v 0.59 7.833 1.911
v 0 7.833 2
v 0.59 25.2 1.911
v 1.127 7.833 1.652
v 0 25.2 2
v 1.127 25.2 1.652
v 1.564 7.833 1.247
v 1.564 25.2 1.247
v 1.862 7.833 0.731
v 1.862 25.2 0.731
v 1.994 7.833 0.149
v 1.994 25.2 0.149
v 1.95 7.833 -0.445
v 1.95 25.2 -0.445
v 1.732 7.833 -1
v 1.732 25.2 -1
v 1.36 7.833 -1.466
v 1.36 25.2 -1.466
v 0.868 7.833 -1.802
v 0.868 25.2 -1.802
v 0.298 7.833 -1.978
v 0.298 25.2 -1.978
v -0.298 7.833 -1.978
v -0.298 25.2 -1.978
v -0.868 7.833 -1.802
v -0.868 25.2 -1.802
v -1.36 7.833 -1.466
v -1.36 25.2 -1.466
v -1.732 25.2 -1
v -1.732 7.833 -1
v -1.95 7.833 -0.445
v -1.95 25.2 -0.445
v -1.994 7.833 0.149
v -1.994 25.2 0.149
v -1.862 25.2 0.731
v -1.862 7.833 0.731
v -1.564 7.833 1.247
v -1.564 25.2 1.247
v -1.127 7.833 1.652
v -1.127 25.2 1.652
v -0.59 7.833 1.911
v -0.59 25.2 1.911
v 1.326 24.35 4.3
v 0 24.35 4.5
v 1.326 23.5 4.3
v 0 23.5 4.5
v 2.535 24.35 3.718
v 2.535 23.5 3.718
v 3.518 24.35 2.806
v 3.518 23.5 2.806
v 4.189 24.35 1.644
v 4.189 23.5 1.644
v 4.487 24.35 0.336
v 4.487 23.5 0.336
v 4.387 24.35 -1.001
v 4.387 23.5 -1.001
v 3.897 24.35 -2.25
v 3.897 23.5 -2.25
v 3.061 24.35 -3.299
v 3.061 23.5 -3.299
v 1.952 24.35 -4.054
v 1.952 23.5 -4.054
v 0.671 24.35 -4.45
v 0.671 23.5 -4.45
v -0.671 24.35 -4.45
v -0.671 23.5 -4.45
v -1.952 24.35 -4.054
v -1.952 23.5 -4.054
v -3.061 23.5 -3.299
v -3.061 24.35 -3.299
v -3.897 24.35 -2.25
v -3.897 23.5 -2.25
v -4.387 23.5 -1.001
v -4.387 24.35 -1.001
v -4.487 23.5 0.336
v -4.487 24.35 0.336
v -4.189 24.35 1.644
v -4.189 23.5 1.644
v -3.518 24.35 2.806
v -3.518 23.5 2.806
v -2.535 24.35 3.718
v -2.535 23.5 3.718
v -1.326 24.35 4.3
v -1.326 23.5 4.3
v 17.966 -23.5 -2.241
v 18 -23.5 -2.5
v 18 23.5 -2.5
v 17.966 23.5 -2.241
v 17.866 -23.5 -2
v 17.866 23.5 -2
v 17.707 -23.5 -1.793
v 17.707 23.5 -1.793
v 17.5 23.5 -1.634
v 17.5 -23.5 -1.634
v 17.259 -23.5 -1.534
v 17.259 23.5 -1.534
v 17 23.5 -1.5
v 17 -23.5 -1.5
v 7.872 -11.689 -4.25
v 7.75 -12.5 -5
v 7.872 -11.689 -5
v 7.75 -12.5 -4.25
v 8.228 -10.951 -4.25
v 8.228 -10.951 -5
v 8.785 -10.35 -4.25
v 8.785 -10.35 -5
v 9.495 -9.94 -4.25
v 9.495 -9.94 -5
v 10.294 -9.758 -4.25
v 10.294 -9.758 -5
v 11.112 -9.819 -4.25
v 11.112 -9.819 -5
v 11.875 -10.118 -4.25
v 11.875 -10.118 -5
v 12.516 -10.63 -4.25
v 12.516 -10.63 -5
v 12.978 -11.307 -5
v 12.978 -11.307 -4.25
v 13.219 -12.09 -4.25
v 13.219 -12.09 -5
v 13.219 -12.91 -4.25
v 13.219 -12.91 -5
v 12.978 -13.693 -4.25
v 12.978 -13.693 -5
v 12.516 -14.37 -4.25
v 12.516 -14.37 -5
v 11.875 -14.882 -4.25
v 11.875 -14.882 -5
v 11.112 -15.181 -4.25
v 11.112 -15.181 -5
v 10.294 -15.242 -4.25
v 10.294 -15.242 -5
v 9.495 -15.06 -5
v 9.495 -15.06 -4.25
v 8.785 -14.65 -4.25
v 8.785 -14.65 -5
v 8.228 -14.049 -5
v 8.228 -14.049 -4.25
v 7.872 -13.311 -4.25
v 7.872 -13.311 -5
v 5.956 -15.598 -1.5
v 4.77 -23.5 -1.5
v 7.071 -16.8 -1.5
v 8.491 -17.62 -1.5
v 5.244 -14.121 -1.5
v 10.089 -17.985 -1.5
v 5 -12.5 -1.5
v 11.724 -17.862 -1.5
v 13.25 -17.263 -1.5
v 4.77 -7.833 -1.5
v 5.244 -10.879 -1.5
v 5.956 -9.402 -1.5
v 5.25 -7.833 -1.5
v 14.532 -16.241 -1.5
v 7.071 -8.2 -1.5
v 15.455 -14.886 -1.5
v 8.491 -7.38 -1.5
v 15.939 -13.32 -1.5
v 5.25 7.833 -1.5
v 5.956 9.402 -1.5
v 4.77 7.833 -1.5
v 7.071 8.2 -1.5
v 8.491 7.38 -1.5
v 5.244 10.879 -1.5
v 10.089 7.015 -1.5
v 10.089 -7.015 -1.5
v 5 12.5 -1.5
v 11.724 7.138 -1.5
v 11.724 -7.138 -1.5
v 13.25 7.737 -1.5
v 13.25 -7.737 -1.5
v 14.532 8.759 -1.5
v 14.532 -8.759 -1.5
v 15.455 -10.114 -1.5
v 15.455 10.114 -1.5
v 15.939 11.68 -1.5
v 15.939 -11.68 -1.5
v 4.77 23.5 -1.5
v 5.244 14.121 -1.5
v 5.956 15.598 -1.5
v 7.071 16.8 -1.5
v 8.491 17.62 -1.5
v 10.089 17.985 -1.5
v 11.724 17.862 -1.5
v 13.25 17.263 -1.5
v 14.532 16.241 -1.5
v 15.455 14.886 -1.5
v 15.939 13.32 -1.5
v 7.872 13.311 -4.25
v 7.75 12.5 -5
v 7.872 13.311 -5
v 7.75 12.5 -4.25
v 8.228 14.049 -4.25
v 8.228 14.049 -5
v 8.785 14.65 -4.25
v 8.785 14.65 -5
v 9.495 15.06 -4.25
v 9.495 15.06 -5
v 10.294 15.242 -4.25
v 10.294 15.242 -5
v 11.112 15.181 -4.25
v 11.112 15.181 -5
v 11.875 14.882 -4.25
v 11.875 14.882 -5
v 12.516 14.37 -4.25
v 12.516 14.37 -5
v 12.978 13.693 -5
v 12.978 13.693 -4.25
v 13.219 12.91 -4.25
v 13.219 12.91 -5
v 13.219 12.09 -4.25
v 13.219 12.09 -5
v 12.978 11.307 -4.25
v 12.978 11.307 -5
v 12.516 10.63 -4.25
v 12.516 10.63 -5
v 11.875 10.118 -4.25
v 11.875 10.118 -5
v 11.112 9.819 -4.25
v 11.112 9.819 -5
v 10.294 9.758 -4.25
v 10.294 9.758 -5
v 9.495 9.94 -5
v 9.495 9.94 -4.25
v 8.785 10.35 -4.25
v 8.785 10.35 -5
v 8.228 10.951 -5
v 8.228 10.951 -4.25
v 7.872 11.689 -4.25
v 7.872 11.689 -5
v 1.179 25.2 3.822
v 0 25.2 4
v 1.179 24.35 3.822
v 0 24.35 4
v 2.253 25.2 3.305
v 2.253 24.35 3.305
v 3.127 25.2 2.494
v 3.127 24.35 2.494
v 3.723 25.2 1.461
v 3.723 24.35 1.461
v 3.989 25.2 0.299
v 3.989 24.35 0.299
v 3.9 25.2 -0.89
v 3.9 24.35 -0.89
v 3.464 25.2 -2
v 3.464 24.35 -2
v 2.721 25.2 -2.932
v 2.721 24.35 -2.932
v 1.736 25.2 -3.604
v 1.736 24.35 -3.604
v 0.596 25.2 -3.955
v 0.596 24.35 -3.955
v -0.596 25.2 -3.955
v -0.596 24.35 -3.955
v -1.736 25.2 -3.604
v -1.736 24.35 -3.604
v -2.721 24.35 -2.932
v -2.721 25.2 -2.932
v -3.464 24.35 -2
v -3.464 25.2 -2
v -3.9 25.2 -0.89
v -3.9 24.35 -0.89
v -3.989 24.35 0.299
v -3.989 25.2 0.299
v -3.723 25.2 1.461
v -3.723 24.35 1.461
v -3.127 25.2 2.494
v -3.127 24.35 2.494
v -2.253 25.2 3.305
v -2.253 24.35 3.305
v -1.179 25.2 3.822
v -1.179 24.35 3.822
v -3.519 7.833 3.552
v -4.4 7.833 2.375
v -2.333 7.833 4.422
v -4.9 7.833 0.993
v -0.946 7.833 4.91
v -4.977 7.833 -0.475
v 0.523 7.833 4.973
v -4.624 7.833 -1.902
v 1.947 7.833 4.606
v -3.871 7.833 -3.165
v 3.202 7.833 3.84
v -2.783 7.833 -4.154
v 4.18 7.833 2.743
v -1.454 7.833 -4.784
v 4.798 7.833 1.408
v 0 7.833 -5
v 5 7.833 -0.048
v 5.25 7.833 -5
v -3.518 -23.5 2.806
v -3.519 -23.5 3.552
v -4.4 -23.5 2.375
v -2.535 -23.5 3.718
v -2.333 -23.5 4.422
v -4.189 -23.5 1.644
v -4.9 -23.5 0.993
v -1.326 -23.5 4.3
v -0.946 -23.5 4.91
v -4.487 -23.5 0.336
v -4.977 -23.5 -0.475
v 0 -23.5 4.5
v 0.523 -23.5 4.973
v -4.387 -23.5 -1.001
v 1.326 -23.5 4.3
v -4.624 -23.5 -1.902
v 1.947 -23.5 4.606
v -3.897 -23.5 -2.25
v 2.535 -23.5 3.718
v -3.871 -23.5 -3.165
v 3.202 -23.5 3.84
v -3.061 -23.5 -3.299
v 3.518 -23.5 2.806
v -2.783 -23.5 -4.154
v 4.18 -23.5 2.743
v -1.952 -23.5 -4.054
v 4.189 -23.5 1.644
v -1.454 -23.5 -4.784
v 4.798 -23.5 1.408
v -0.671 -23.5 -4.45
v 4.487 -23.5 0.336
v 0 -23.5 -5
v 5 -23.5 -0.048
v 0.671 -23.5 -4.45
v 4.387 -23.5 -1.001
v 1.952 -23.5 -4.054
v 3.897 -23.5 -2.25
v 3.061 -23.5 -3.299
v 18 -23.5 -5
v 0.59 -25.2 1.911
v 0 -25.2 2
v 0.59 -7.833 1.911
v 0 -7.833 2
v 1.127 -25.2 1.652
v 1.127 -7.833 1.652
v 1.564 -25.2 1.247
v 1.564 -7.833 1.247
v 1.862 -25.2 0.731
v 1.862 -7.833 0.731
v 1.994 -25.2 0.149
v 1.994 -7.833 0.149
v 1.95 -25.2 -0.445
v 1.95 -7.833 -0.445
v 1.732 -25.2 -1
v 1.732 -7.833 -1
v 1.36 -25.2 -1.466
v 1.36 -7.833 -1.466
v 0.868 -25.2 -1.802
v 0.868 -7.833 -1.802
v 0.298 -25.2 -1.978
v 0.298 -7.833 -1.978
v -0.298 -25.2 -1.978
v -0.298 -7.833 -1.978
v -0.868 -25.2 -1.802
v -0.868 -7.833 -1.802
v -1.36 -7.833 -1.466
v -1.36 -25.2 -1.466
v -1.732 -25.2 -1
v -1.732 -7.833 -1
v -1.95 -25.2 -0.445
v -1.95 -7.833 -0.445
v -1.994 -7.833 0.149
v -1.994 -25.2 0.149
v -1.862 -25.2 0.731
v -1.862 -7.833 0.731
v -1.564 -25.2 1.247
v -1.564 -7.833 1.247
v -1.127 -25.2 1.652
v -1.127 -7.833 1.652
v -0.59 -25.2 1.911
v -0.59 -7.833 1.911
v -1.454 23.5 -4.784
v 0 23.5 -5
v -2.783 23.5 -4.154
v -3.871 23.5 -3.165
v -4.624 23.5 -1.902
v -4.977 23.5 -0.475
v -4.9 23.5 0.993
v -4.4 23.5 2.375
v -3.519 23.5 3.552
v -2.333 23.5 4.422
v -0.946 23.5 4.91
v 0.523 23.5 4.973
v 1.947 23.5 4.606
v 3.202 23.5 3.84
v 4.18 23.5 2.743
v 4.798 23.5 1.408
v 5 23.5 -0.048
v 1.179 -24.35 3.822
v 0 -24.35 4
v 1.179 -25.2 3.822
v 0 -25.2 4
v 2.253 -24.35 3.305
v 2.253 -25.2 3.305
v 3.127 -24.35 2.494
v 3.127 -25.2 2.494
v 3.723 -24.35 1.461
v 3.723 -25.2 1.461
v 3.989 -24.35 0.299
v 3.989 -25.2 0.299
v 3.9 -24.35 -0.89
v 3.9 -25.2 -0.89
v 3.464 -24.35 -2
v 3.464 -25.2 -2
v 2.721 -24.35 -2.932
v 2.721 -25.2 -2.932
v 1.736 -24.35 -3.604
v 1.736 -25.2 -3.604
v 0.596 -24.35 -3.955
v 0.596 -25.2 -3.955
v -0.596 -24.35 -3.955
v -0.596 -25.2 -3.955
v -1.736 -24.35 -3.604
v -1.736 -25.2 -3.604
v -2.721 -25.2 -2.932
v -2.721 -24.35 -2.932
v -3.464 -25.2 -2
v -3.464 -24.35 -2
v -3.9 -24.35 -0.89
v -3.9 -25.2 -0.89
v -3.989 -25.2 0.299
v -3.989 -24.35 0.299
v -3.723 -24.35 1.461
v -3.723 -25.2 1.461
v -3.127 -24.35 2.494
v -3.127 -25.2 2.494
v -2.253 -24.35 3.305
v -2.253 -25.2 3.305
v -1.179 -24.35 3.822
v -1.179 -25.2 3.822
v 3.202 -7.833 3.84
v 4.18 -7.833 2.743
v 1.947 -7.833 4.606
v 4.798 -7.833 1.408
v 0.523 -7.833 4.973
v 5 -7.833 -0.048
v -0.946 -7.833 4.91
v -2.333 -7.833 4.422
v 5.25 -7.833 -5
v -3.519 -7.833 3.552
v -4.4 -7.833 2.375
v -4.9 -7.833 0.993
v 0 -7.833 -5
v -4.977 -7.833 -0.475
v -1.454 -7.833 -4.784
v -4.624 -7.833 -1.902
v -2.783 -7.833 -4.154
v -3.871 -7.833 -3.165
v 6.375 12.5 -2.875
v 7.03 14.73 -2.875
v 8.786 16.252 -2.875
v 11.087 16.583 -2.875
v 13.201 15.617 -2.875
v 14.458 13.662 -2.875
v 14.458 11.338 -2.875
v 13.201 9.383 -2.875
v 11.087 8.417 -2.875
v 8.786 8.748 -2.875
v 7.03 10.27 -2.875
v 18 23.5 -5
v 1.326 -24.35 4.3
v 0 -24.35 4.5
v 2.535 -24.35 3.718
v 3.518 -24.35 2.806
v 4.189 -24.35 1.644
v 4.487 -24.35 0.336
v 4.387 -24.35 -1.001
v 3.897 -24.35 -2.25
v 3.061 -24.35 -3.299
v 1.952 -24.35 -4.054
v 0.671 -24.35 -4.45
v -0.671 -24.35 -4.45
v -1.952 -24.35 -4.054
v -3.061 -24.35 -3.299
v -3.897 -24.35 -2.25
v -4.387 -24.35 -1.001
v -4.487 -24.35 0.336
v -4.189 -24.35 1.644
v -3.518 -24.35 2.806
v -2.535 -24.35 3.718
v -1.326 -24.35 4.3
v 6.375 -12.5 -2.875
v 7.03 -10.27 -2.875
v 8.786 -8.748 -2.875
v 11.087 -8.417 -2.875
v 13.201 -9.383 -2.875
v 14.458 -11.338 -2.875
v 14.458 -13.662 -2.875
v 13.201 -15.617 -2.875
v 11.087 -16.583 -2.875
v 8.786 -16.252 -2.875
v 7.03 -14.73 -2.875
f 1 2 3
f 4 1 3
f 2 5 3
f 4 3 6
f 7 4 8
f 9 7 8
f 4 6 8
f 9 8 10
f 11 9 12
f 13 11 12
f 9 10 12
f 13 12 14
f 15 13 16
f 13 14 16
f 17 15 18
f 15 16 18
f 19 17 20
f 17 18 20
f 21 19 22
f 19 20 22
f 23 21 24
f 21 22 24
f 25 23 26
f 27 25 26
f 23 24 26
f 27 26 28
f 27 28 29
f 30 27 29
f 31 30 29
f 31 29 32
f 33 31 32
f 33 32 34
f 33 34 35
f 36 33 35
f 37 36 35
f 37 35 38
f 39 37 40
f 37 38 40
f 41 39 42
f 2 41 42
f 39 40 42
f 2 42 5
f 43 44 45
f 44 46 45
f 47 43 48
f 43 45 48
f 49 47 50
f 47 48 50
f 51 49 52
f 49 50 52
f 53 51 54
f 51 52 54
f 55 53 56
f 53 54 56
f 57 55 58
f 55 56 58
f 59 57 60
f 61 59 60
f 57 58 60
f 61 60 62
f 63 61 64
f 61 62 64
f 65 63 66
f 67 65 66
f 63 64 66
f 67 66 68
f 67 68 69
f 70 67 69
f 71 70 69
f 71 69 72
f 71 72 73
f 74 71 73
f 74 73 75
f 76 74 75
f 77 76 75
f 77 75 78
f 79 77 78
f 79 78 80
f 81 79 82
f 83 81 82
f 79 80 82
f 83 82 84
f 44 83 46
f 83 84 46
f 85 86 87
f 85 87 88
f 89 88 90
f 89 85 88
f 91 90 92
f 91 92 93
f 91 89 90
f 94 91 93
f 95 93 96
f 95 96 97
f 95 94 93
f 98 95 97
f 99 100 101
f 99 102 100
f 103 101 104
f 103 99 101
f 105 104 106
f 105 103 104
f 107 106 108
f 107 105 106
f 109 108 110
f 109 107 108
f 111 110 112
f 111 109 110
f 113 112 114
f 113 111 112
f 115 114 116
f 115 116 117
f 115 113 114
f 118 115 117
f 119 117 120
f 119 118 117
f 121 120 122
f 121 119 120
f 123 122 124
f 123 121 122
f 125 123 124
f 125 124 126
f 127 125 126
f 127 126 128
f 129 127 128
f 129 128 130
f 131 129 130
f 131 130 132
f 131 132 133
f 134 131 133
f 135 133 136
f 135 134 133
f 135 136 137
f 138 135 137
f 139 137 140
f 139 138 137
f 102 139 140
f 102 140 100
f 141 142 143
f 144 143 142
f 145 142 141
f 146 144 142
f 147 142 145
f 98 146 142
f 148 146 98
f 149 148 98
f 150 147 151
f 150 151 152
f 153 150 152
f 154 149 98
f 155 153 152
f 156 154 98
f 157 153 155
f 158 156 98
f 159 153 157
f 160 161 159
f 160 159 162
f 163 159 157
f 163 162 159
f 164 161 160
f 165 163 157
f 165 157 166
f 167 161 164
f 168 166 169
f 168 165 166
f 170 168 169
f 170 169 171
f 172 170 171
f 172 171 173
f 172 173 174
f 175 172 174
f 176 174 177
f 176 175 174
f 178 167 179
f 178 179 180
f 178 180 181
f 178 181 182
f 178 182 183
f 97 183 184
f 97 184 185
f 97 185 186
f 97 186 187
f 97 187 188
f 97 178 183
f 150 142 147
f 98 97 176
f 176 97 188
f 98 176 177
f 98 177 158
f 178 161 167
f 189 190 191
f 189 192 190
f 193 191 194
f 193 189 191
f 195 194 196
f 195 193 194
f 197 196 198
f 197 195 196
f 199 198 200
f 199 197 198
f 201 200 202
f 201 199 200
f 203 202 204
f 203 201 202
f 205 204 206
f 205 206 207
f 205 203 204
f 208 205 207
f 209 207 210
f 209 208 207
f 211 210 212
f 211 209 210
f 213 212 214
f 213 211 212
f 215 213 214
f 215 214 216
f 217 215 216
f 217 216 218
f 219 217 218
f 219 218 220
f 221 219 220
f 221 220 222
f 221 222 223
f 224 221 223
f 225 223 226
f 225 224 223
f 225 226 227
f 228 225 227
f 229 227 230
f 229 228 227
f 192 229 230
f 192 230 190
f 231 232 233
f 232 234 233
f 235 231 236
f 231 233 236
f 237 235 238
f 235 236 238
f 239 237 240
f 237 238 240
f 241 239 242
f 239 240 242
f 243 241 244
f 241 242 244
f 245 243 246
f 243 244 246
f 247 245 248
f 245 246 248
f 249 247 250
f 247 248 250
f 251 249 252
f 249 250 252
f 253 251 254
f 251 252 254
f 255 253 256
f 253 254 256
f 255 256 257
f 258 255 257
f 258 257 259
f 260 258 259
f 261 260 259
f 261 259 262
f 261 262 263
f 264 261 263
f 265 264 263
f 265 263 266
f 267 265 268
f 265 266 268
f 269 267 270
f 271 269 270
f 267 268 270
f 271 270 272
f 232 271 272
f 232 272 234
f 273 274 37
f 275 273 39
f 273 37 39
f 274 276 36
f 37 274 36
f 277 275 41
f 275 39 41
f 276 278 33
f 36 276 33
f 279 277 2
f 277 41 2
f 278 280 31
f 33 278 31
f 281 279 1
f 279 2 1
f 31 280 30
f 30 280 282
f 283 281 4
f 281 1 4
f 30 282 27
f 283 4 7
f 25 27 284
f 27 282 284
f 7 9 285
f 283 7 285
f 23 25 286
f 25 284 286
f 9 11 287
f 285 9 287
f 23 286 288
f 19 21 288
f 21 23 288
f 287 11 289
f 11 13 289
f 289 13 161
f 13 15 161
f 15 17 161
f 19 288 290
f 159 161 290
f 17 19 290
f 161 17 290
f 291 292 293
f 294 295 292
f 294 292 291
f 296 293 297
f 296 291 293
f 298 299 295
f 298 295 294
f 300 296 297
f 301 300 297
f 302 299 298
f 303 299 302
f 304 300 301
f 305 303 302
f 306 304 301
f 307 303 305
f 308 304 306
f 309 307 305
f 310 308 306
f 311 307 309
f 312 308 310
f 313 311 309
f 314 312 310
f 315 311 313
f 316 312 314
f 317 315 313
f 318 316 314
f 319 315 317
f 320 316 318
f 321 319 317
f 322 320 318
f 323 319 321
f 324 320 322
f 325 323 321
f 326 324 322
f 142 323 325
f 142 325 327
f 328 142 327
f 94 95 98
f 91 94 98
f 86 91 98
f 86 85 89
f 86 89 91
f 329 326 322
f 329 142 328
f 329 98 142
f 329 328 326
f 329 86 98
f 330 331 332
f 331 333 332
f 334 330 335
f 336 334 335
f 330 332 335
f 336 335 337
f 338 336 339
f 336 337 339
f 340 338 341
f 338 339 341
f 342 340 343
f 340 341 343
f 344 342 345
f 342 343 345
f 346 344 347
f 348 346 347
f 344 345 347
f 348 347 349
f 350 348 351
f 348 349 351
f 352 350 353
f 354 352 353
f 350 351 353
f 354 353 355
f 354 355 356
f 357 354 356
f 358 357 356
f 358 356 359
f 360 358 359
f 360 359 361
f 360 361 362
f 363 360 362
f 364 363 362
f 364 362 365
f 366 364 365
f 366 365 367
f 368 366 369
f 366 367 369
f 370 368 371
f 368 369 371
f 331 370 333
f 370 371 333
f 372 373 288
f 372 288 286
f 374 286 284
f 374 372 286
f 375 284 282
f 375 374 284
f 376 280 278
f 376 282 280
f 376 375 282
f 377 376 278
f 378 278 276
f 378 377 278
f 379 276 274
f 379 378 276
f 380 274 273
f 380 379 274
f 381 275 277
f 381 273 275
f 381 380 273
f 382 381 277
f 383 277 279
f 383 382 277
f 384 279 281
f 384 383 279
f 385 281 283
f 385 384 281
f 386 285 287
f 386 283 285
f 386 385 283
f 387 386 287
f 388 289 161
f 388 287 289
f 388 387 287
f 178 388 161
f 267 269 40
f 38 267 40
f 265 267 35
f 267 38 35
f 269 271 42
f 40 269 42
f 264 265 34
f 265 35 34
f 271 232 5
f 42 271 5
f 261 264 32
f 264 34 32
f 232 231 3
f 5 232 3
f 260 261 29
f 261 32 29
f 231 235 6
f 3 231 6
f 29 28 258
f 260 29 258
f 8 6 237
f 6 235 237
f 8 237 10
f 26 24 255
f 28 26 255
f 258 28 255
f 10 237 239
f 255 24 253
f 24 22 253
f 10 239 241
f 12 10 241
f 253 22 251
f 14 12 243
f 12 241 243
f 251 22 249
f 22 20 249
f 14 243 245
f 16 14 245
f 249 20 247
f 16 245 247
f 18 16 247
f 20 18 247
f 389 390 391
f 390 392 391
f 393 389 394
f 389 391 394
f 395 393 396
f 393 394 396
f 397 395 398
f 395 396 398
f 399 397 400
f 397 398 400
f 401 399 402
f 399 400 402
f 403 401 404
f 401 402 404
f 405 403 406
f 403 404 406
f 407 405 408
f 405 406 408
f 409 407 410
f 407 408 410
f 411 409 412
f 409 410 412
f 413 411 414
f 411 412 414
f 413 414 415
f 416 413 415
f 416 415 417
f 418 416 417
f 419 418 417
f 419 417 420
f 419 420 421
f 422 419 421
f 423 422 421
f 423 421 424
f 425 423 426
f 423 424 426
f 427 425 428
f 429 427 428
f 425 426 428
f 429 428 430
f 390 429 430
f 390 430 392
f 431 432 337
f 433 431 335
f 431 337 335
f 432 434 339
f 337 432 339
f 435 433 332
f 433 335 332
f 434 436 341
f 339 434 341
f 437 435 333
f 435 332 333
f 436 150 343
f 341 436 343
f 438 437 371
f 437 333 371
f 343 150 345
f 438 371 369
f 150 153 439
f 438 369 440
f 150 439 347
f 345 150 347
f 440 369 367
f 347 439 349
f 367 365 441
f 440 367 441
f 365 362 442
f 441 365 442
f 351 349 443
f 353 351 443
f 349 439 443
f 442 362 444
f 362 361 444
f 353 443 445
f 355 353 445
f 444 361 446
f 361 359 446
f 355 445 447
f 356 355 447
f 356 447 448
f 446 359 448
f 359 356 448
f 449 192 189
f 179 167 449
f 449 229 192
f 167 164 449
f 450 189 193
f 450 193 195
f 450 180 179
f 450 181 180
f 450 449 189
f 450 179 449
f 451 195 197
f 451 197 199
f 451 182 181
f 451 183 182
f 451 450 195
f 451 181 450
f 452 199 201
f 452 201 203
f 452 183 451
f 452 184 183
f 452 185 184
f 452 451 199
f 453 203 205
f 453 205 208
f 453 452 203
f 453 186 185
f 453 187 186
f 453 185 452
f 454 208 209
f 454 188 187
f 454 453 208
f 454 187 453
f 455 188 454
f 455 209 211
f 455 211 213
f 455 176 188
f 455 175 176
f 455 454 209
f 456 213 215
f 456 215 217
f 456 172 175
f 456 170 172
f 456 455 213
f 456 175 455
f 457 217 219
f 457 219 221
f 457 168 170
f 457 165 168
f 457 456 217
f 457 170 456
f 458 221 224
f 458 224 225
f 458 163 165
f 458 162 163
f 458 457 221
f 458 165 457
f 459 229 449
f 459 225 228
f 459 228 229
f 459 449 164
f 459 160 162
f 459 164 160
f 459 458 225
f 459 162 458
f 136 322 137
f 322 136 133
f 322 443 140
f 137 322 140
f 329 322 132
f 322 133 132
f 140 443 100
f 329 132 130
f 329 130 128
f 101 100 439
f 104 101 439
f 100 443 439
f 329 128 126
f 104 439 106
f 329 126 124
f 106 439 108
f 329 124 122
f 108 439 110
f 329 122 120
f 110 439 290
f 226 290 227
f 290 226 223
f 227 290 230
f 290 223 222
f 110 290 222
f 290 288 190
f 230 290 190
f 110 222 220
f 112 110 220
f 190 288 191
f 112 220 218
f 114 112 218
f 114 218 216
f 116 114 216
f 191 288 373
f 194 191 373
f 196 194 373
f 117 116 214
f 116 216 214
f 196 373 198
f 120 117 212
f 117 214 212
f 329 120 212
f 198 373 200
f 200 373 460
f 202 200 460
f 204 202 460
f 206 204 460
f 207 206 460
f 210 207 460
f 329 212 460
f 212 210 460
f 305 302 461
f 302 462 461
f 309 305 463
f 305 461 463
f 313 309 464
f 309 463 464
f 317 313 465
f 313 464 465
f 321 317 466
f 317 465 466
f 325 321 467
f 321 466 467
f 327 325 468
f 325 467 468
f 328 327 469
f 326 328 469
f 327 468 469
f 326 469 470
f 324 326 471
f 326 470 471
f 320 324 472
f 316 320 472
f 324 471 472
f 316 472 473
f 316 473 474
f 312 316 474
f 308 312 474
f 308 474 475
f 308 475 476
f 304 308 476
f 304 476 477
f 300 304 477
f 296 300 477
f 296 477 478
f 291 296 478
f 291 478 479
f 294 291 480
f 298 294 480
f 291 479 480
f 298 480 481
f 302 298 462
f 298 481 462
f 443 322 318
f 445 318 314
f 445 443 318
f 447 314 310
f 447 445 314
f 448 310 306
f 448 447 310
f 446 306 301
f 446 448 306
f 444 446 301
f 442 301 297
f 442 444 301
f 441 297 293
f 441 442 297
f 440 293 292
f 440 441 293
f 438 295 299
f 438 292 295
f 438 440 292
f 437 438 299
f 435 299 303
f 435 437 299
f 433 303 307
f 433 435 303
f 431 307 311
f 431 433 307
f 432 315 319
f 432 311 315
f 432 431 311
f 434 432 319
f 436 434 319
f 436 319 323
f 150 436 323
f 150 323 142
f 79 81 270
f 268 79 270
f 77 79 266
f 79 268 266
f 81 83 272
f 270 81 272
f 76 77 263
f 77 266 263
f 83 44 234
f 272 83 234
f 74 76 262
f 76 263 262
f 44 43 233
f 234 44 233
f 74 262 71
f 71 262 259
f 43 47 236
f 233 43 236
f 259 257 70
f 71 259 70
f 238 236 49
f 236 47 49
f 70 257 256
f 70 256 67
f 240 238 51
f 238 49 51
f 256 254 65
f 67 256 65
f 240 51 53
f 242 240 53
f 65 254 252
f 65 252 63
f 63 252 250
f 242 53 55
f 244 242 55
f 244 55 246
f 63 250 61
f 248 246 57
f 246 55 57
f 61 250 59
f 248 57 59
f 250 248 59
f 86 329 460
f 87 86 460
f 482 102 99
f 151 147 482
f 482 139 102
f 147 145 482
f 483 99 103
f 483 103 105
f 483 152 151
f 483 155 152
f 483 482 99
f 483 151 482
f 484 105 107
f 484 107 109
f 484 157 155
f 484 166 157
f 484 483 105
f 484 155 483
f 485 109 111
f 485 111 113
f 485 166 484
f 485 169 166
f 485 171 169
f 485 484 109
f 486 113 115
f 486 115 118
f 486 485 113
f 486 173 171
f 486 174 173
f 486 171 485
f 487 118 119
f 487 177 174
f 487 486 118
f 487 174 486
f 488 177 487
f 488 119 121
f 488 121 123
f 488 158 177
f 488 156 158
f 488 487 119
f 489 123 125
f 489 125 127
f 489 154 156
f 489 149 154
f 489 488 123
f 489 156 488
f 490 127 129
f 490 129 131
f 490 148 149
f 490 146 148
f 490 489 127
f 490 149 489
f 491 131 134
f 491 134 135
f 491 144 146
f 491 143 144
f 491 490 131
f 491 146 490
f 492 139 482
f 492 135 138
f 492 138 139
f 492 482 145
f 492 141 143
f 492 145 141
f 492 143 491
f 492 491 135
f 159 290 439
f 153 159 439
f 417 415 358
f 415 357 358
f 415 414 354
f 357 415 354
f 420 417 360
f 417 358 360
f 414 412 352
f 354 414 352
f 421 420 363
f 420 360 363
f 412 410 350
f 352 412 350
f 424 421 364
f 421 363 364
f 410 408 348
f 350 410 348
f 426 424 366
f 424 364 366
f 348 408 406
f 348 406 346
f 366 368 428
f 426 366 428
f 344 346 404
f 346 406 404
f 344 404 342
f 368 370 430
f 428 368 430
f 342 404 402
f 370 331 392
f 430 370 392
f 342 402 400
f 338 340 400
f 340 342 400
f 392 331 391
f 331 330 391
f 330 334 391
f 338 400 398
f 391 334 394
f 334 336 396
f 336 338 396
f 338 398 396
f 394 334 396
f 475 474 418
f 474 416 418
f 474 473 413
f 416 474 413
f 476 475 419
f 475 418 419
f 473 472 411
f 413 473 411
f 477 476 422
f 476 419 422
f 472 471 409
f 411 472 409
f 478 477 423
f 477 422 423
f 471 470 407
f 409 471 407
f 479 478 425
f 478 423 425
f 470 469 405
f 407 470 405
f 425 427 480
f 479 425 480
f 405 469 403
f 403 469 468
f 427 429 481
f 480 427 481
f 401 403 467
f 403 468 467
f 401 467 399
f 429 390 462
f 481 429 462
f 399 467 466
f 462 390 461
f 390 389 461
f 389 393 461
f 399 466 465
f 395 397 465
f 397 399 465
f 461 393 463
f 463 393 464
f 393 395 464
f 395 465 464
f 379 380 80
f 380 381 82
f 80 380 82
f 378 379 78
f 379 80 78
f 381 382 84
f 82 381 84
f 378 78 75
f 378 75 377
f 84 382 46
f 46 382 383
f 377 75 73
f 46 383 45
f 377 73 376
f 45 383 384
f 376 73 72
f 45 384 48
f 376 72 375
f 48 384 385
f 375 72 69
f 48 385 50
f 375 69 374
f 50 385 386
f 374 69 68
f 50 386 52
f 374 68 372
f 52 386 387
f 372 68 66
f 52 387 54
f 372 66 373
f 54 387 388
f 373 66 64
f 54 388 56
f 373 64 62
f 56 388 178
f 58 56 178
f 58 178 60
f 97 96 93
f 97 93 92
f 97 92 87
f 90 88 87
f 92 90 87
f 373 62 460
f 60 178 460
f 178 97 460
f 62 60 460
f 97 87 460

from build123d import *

# Parameters (mm, degrees)
SKETCH1_W               = 5
SKETCH1_H               = 47
SKETCH2_W               = 18
SKETCH2_H               = 47
BOSS_EXTRUDE1_DEPTH     = 3.5
CUT_EXTRUDE1_DEPTH      = 47
CUT_EXTRUDE1_DEPTH_BACK = 47
SKETCH3_W               = 94
SKETCH3_H               = 94
SKETCH6_W               = 2
SKETCH6_H               = 53.4
CUT_EXTRUDE2_DEPTH      = 23.5
CUT_EXTRUDE2_DEPTH_BACK = 23.5


with BuildPart() as part:
    # Sketch1 → Revolve1 (revolve)
    with BuildSketch(Plane.XY):
        with Locations((2.5, 0)):
            Rectangle(SKETCH1_W, SKETCH1_H)
    revolve(axis=Axis((0, -23.5, 0), (0, 1, 0)))

    # Sketch2 → Boss-Extrude1 (add)
    with BuildSketch(Plane.XY.offset(-5)):
        with Locations((9, 0)):
            Rectangle(SKETCH2_W, SKETCH2_H)
    extrude(amount=BOSS_EXTRUDE1_DEPTH)

    # Sketch3 → Cut-Extrude1 (cut, two sides: drawn at the far end of the back side and taken through both)
    with BuildSketch(Plane.XY.offset(-CUT_EXTRUDE1_DEPTH_BACK)):
        Rectangle(SKETCH3_W, SKETCH3_H)
        Polygon((-5, 7.833333333), (5.25, 7.833333333), (5.25, -7.833333333), (-5, -7.833333333), (-5, -23.5), (18, -23.5), (18, 23.5), (-5, 23.5), align=None, mode=Mode.SUBTRACT)
    extrude(amount=CUT_EXTRUDE1_DEPTH + CUT_EXTRUDE1_DEPTH_BACK, mode=Mode.SUBTRACT)

    # Sketch4 → Revolve2 (revolve)
    with BuildSketch(Plane.XY):
        Polygon((0, 25.2), (4, 25.2), (4, 24.35), (4.5, 24.35), (4.5, 23.5), (0, 23.5), align=None)
    revolve(axis=Axis((0, 23.5, 0), (0, 1, 0)))

    # Sketch5 → Revolve3 (revolve)
    with BuildSketch(Plane.XY):
        Polygon((0, -23.5), (4.5, -23.5), (4.5, -24.35), (4, -24.35), (4, -25.2), (0, -25.2), align=None)
    revolve(axis=Axis((0, -25.2, 0), (0, 1, 0)))

    # Sketch6 → Cut-Revolve1 (revolve, cut)
    with BuildSketch(Plane.XY):
        with Locations((1, 0)):
            Rectangle(SKETCH6_W, SKETCH6_H)
    revolve(axis=Axis((0, -26.7, 0), (0, 1, 0)), mode=Mode.SUBTRACT)

    # Sketch7 → Cut-Revolve2 (revolve, cut)
    with BuildSketch(Plane(origin=(10.5, 0, 0), x_dir=(0, 0, -1), z_dir=(1, 0, 0))):
        Polygon((5, -12.5), (5, -15.25), (4.25, -15.25), (1.5, -18), (1.5, -12.5), align=None)
    revolve(axis=Axis((10.5, -12.5, -1.5), (0, 0, -1)), mode=Mode.SUBTRACT)

    # Sketch8 → Cut-Revolve3 (revolve, cut)
    with BuildSketch(Plane(origin=(10.5, 0, 0), x_dir=(0, 0, -1), z_dir=(1, 0, 0))):
        Polygon((5, 12.5), (5, 9.75), (4.25, 9.75), (1.5, 7), (1.5, 12.5), align=None)
    revolve(axis=Axis((10.5, 12.5, -1.5), (0, 0, -1)), mode=Mode.SUBTRACT)

    # Sketch9 → Cut-Extrude2 (cut, two sides: drawn at the far end of the back side and taken through both)
    with BuildSketch(Plane(origin=(0, 0, 0), x_dir=(1, 0, 0), z_dir=(0, 1, 0)).offset(-CUT_EXTRUDE2_DEPTH_BACK)):
        with BuildLine():
            Line((17, 1.5), (18, 1.5))
            Line((18, 1.5), (18, 2.5))
            ThreePointArc((18, 2.5), (17.707106781, 1.792893219), (17, 1.5))
        make_face()
    extrude(amount=CUT_EXTRUDE2_DEPTH + CUT_EXTRUDE2_DEPTH_BACK, mode=Mode.SUBTRACT)


solid = part.part
